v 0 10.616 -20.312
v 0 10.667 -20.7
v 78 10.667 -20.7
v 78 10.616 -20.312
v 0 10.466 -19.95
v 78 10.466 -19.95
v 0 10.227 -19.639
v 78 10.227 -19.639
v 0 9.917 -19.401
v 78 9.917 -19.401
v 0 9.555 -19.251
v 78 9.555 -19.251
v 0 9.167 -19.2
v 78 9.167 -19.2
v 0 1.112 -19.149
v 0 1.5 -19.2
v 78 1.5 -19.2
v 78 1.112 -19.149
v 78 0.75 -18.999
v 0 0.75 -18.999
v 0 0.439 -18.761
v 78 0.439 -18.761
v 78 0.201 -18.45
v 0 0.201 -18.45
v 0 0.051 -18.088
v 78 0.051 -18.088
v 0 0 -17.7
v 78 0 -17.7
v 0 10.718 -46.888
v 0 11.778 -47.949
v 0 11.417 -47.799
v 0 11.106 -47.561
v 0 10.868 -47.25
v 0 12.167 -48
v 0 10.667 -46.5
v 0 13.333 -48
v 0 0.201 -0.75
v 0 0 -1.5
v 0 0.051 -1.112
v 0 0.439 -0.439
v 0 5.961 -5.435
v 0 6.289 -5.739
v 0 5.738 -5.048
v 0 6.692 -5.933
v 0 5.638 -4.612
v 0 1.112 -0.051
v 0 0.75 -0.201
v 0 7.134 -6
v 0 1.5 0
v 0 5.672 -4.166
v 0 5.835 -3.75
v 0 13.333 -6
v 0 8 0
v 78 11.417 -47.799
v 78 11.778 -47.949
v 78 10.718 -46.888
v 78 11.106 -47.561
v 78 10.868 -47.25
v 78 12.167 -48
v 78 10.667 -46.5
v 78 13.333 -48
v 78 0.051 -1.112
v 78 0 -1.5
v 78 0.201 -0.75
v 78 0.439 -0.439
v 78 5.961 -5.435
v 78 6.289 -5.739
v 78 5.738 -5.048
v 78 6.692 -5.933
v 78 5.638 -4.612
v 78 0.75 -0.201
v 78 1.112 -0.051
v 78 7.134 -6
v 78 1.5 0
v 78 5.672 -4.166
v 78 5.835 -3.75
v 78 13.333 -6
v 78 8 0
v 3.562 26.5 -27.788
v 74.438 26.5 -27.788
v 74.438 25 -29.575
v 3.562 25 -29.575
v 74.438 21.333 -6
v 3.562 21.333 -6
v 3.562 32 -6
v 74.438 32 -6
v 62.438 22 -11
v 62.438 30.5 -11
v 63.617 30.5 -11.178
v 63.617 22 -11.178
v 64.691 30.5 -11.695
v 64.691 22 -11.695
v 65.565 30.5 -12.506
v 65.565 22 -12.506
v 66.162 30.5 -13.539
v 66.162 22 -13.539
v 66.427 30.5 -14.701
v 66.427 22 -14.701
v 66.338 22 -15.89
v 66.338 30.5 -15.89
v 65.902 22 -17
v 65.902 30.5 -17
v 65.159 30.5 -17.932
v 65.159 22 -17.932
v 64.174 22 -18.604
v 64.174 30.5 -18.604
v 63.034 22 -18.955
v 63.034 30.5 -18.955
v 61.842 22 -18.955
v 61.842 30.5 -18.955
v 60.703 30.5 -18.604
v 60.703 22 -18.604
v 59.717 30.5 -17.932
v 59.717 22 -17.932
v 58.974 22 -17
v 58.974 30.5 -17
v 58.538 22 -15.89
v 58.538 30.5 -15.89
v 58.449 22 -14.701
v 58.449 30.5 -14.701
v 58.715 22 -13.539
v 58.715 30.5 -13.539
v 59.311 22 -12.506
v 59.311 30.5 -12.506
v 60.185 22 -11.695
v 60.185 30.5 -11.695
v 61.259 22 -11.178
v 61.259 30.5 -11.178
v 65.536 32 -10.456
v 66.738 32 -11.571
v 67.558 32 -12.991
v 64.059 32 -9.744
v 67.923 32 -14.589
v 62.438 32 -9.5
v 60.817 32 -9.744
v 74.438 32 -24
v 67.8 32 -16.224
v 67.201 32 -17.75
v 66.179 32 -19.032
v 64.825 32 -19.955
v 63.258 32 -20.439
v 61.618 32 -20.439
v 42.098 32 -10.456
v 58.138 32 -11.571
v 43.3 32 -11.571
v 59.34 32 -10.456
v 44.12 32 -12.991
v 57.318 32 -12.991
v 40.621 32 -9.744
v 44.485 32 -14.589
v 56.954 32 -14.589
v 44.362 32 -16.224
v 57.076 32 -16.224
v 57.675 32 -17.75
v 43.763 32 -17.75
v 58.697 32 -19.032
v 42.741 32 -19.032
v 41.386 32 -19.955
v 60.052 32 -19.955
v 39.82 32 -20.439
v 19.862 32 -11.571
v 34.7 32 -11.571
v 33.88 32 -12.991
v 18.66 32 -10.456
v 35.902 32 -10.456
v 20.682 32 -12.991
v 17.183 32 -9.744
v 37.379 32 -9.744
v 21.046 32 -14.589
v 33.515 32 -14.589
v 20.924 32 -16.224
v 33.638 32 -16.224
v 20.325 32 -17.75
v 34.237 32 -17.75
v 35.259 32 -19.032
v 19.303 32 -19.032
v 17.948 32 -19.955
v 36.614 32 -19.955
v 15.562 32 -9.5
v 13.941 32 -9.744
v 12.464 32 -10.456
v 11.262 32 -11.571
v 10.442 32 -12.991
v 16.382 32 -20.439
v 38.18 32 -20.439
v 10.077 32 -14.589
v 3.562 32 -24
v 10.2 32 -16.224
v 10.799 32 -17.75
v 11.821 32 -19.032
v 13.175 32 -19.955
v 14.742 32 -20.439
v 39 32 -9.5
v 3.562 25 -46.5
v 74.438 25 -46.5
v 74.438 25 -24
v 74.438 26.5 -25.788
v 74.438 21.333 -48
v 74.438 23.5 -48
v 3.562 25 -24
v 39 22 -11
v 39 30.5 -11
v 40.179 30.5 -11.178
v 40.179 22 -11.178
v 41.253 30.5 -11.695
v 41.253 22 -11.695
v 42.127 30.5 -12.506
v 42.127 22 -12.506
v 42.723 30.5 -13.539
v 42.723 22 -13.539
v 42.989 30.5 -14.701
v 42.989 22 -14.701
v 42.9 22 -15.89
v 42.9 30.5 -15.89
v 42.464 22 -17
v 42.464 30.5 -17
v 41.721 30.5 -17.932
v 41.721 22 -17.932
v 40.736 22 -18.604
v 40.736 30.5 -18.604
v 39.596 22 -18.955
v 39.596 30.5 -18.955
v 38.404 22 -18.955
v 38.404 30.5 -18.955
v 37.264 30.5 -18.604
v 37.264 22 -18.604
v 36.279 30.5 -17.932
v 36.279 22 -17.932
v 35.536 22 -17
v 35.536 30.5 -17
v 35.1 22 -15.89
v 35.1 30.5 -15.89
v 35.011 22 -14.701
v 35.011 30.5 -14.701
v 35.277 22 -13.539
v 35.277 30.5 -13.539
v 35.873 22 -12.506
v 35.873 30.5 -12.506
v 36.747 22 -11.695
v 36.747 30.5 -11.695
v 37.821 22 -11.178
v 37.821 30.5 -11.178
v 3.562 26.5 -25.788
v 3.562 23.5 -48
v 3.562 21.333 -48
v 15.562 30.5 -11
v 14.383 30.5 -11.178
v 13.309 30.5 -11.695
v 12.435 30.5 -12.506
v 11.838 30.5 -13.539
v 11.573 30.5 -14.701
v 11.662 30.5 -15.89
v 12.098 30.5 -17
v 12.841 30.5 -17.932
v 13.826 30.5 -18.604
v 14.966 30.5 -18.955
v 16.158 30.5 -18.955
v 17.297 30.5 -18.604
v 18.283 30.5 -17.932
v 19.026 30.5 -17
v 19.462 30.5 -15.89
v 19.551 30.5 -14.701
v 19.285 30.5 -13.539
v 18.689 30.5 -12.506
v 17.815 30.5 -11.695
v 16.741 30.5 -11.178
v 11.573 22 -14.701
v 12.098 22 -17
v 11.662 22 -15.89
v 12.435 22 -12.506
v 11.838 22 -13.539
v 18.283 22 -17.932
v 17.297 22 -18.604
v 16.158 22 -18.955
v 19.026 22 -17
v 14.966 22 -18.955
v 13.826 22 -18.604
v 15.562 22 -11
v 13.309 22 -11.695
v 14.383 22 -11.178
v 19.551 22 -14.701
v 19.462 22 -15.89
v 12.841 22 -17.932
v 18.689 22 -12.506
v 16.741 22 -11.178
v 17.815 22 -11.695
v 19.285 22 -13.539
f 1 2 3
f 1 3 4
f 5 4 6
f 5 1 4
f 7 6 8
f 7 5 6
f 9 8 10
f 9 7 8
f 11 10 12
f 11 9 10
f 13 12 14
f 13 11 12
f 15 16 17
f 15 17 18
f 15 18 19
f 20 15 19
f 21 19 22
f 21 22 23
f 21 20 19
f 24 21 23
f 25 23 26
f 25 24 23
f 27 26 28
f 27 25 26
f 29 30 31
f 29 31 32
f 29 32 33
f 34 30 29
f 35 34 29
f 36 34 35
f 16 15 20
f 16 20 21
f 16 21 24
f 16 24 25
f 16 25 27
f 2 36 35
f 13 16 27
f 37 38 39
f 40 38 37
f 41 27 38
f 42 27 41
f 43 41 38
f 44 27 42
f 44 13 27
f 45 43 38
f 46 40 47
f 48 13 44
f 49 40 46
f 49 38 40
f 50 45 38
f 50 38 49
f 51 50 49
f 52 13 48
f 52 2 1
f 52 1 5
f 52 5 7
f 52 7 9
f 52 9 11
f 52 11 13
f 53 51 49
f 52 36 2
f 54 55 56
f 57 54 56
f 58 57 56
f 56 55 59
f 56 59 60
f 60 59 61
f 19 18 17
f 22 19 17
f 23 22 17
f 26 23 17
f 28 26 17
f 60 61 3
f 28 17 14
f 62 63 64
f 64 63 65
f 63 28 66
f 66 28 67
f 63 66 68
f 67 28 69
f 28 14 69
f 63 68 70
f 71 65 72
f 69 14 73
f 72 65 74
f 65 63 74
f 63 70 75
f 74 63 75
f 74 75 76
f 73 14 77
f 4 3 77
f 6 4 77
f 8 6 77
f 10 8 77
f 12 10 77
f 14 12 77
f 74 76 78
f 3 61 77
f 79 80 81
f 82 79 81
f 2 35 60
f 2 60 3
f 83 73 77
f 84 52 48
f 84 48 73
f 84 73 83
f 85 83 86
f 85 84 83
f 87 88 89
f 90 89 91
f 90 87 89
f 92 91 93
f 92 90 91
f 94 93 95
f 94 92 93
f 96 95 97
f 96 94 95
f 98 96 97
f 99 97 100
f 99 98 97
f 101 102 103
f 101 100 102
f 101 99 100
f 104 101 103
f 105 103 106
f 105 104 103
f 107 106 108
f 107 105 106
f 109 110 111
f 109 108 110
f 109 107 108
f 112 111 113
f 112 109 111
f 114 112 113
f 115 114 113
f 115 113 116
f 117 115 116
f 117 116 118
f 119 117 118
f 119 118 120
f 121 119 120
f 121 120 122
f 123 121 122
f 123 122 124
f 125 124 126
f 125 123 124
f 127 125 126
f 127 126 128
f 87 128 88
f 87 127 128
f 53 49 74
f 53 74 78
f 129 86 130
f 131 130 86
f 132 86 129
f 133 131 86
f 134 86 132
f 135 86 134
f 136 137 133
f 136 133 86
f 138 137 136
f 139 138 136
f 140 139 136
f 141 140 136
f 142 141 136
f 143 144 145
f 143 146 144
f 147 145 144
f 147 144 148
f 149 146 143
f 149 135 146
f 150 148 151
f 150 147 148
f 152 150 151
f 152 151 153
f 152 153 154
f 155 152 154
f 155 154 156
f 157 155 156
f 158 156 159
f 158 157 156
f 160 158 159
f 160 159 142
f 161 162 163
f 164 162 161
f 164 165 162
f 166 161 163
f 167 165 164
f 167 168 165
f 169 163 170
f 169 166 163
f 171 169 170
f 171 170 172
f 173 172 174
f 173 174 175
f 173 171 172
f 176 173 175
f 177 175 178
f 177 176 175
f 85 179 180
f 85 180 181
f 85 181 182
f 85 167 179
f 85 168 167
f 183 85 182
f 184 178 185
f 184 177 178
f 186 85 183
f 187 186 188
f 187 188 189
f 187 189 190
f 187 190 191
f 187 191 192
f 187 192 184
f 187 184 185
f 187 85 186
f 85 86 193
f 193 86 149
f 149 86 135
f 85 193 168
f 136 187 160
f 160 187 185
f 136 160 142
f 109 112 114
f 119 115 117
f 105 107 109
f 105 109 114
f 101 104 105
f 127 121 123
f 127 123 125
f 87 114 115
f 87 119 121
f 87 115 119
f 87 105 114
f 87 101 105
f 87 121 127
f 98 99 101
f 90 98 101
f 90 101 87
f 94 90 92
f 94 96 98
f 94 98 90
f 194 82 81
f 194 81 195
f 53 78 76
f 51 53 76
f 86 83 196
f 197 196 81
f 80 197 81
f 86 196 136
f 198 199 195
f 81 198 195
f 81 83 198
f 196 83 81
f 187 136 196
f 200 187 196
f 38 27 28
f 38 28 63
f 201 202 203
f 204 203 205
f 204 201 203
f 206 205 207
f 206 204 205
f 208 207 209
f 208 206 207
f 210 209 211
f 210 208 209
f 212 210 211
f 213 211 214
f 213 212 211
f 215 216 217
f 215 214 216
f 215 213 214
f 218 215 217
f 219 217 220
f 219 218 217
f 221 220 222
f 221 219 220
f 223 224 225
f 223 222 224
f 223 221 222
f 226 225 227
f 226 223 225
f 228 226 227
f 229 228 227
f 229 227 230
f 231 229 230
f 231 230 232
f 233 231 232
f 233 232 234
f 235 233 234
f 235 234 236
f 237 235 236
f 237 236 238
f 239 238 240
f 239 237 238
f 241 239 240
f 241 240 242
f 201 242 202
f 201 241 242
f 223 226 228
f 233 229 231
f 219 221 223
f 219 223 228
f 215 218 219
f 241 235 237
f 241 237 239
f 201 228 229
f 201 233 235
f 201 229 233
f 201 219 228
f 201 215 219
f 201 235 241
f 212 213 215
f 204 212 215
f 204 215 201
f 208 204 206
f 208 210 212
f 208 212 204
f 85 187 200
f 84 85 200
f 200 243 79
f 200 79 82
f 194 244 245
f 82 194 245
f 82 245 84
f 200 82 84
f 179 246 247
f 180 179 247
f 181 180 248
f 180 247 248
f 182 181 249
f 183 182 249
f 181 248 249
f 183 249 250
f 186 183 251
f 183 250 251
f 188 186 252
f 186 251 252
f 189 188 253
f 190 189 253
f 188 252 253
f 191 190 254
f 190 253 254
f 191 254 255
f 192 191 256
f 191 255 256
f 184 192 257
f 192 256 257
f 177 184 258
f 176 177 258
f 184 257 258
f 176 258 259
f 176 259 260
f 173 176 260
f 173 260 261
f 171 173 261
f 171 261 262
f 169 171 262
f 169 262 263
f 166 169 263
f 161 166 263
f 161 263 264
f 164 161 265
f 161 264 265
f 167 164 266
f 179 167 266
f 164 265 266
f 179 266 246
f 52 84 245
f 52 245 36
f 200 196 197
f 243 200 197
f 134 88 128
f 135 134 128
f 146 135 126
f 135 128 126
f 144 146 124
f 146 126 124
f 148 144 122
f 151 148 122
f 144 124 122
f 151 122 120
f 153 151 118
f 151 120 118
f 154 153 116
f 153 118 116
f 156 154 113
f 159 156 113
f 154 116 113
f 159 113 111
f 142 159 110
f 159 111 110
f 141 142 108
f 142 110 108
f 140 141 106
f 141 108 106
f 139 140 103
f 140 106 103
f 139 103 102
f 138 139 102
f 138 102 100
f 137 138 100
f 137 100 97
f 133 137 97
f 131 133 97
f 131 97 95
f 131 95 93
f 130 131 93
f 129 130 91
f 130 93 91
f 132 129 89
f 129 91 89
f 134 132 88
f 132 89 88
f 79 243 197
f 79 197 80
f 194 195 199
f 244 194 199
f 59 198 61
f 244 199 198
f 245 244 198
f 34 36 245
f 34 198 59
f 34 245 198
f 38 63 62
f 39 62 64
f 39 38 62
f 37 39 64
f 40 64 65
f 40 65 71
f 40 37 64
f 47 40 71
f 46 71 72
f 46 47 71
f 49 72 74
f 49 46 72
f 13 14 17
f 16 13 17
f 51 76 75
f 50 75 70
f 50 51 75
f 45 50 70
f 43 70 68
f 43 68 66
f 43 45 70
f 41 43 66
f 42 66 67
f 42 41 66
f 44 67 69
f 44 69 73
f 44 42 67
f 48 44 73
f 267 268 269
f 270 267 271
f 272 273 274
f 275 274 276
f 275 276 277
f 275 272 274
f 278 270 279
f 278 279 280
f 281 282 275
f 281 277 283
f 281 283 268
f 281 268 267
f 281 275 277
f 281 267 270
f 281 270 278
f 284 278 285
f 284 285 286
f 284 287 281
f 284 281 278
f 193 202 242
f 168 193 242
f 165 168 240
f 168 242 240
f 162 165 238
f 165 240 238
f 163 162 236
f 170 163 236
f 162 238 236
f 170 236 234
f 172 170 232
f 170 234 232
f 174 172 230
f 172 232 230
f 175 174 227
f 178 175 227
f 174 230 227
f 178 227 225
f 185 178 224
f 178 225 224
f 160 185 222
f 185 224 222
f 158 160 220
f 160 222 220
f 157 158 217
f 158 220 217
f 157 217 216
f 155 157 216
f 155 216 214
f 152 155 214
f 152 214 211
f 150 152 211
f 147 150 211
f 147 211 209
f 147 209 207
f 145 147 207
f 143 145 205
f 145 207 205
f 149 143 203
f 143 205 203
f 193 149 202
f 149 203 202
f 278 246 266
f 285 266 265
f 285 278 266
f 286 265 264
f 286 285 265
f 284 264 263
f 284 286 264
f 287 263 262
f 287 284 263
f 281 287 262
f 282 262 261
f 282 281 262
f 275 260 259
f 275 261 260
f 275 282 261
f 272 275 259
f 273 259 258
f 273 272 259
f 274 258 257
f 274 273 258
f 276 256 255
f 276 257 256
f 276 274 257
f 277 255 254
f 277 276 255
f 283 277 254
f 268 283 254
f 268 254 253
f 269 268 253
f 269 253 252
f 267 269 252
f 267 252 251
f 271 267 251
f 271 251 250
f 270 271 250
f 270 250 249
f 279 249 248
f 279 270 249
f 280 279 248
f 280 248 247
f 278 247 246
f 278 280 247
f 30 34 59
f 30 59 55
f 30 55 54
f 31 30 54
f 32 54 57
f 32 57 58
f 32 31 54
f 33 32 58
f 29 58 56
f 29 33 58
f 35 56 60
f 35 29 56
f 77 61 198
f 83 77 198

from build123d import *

# Parameters (mm, degrees)
BOSS_EXTRUDE1_DEPTH     = 78
CUT_EXTRUDE1_DEPTH      = 98.015462685
CUT_EXTRUDE1_DEPTH_BACK = 98.015462685
CUT_EXTRUDE2_DEPTH      = 98.015462685
CUT_EXTRUDE2_DEPTH_BACK = 10
SKETCH3_R               = 4
CHAMFER1_SIZE           = 1.5


with BuildPart() as part:
    # Sketch1 → Boss-Extrude1 (new body)
    with BuildSketch(Plane(origin=(0, 0, 0), x_dir=(0, 0, -1), z_dir=(1, 0, 0))):
        with BuildLine():
            Line((0, 8), (3.75, 5.834936491))
            ThreePointArc((3.75, 5.834936491), (5.25, 5.834936491), (6, 7.133974596))
            Line((6, 7.133974596), (6, 32))
            Line((6, 32), (24, 32))
            Line((24, 32), (24, 25))
            Line((24, 25), (25.787630389, 26.5))
            Line((25.787630389, 26.5), (27.787630389, 26.5))
            Line((27.787630389, 26.5), (29.575260778, 25))
            Line((29.575260778, 25), (46.5, 25))
            Line((46.5, 25), (48, 23.5))
            Line((48, 23.5), (48, 12.166666667))
            ThreePointArc((48, 12.166666667), (47.560660172, 11.106006495), (46.5, 10.666666667))
            Line((46.5, 10.666666667), (20.7, 10.666666667))
            ThreePointArc((20.7, 10.666666667), (19.639339828, 10.227326838), (19.2, 9.166666667))
            Line((19.2, 9.166666667), (19.2, 1.5))
            ThreePointArc((19.2, 1.5), (18.760660172, 0.439339828), (17.7, 0))
            Line((17.7, 0), (1.5, 0))
            ThreePointArc((1.5, 0), (0.439339828, 0.439339828), (0, 1.5))
            Line((0, 1.5), (0, 8))
        make_face()
    extrude(amount=BOSS_EXTRUDE1_DEPTH)

    # Sketch2 → Cut-Extrude1 (cut, two sides: drawn at the far end of the back side and taken through both)
    with BuildSketch(Plane.XY.offset(-CUT_EXTRUDE1_DEPTH_BACK)):
        Polygon((3.561829482, 32), (3.561829482, 21.333333333), (0, 13.333333333), (0, 32), align=None)
        Polygon((78, 13.333333333), (74.438170518, 21.333333333), (74.438170518, 32), (78, 32), align=None)
    extrude(amount=CUT_EXTRUDE1_DEPTH + CUT_EXTRUDE1_DEPTH_BACK, mode=Mode.SUBTRACT)

    # Sketch3 → Cut-Extrude2 (cut, two sides: drawn at the far end of the back side and taken through both)
    with BuildSketch(Plane(origin=(0, 32, 0), x_dir=(1, 0, 0), z_dir=(0, 1, 0)).offset(-CUT_EXTRUDE2_DEPTH_BACK)):
        with Locations(Location((15.561829482, 15, 0), (0, 0, 270))):
            Circle(SKETCH3_R)
        with Locations(Location((62.438170518, 15, 0), (0, 0, 270))):
            Circle(SKETCH3_R)
        with Locations(Location((39, 15, 0), (0, 0, 270))):
            Circle(SKETCH3_R)
    extrude(amount=CUT_EXTRUDE2_DEPTH + CUT_EXTRUDE2_DEPTH_BACK, mode=Mode.SUBTRACT)

    # Chamfer1
    chamfer1_edges = [part.edges().sort_by_distance(p)[0] for p in [
        (15.561829482, 32, -19),
        (62.438170518, 32, -19),
        (39, 32, -19),
    ]]
    chamfer(chamfer1_edges, length=CHAMFER1_SIZE)


solid = part.part
